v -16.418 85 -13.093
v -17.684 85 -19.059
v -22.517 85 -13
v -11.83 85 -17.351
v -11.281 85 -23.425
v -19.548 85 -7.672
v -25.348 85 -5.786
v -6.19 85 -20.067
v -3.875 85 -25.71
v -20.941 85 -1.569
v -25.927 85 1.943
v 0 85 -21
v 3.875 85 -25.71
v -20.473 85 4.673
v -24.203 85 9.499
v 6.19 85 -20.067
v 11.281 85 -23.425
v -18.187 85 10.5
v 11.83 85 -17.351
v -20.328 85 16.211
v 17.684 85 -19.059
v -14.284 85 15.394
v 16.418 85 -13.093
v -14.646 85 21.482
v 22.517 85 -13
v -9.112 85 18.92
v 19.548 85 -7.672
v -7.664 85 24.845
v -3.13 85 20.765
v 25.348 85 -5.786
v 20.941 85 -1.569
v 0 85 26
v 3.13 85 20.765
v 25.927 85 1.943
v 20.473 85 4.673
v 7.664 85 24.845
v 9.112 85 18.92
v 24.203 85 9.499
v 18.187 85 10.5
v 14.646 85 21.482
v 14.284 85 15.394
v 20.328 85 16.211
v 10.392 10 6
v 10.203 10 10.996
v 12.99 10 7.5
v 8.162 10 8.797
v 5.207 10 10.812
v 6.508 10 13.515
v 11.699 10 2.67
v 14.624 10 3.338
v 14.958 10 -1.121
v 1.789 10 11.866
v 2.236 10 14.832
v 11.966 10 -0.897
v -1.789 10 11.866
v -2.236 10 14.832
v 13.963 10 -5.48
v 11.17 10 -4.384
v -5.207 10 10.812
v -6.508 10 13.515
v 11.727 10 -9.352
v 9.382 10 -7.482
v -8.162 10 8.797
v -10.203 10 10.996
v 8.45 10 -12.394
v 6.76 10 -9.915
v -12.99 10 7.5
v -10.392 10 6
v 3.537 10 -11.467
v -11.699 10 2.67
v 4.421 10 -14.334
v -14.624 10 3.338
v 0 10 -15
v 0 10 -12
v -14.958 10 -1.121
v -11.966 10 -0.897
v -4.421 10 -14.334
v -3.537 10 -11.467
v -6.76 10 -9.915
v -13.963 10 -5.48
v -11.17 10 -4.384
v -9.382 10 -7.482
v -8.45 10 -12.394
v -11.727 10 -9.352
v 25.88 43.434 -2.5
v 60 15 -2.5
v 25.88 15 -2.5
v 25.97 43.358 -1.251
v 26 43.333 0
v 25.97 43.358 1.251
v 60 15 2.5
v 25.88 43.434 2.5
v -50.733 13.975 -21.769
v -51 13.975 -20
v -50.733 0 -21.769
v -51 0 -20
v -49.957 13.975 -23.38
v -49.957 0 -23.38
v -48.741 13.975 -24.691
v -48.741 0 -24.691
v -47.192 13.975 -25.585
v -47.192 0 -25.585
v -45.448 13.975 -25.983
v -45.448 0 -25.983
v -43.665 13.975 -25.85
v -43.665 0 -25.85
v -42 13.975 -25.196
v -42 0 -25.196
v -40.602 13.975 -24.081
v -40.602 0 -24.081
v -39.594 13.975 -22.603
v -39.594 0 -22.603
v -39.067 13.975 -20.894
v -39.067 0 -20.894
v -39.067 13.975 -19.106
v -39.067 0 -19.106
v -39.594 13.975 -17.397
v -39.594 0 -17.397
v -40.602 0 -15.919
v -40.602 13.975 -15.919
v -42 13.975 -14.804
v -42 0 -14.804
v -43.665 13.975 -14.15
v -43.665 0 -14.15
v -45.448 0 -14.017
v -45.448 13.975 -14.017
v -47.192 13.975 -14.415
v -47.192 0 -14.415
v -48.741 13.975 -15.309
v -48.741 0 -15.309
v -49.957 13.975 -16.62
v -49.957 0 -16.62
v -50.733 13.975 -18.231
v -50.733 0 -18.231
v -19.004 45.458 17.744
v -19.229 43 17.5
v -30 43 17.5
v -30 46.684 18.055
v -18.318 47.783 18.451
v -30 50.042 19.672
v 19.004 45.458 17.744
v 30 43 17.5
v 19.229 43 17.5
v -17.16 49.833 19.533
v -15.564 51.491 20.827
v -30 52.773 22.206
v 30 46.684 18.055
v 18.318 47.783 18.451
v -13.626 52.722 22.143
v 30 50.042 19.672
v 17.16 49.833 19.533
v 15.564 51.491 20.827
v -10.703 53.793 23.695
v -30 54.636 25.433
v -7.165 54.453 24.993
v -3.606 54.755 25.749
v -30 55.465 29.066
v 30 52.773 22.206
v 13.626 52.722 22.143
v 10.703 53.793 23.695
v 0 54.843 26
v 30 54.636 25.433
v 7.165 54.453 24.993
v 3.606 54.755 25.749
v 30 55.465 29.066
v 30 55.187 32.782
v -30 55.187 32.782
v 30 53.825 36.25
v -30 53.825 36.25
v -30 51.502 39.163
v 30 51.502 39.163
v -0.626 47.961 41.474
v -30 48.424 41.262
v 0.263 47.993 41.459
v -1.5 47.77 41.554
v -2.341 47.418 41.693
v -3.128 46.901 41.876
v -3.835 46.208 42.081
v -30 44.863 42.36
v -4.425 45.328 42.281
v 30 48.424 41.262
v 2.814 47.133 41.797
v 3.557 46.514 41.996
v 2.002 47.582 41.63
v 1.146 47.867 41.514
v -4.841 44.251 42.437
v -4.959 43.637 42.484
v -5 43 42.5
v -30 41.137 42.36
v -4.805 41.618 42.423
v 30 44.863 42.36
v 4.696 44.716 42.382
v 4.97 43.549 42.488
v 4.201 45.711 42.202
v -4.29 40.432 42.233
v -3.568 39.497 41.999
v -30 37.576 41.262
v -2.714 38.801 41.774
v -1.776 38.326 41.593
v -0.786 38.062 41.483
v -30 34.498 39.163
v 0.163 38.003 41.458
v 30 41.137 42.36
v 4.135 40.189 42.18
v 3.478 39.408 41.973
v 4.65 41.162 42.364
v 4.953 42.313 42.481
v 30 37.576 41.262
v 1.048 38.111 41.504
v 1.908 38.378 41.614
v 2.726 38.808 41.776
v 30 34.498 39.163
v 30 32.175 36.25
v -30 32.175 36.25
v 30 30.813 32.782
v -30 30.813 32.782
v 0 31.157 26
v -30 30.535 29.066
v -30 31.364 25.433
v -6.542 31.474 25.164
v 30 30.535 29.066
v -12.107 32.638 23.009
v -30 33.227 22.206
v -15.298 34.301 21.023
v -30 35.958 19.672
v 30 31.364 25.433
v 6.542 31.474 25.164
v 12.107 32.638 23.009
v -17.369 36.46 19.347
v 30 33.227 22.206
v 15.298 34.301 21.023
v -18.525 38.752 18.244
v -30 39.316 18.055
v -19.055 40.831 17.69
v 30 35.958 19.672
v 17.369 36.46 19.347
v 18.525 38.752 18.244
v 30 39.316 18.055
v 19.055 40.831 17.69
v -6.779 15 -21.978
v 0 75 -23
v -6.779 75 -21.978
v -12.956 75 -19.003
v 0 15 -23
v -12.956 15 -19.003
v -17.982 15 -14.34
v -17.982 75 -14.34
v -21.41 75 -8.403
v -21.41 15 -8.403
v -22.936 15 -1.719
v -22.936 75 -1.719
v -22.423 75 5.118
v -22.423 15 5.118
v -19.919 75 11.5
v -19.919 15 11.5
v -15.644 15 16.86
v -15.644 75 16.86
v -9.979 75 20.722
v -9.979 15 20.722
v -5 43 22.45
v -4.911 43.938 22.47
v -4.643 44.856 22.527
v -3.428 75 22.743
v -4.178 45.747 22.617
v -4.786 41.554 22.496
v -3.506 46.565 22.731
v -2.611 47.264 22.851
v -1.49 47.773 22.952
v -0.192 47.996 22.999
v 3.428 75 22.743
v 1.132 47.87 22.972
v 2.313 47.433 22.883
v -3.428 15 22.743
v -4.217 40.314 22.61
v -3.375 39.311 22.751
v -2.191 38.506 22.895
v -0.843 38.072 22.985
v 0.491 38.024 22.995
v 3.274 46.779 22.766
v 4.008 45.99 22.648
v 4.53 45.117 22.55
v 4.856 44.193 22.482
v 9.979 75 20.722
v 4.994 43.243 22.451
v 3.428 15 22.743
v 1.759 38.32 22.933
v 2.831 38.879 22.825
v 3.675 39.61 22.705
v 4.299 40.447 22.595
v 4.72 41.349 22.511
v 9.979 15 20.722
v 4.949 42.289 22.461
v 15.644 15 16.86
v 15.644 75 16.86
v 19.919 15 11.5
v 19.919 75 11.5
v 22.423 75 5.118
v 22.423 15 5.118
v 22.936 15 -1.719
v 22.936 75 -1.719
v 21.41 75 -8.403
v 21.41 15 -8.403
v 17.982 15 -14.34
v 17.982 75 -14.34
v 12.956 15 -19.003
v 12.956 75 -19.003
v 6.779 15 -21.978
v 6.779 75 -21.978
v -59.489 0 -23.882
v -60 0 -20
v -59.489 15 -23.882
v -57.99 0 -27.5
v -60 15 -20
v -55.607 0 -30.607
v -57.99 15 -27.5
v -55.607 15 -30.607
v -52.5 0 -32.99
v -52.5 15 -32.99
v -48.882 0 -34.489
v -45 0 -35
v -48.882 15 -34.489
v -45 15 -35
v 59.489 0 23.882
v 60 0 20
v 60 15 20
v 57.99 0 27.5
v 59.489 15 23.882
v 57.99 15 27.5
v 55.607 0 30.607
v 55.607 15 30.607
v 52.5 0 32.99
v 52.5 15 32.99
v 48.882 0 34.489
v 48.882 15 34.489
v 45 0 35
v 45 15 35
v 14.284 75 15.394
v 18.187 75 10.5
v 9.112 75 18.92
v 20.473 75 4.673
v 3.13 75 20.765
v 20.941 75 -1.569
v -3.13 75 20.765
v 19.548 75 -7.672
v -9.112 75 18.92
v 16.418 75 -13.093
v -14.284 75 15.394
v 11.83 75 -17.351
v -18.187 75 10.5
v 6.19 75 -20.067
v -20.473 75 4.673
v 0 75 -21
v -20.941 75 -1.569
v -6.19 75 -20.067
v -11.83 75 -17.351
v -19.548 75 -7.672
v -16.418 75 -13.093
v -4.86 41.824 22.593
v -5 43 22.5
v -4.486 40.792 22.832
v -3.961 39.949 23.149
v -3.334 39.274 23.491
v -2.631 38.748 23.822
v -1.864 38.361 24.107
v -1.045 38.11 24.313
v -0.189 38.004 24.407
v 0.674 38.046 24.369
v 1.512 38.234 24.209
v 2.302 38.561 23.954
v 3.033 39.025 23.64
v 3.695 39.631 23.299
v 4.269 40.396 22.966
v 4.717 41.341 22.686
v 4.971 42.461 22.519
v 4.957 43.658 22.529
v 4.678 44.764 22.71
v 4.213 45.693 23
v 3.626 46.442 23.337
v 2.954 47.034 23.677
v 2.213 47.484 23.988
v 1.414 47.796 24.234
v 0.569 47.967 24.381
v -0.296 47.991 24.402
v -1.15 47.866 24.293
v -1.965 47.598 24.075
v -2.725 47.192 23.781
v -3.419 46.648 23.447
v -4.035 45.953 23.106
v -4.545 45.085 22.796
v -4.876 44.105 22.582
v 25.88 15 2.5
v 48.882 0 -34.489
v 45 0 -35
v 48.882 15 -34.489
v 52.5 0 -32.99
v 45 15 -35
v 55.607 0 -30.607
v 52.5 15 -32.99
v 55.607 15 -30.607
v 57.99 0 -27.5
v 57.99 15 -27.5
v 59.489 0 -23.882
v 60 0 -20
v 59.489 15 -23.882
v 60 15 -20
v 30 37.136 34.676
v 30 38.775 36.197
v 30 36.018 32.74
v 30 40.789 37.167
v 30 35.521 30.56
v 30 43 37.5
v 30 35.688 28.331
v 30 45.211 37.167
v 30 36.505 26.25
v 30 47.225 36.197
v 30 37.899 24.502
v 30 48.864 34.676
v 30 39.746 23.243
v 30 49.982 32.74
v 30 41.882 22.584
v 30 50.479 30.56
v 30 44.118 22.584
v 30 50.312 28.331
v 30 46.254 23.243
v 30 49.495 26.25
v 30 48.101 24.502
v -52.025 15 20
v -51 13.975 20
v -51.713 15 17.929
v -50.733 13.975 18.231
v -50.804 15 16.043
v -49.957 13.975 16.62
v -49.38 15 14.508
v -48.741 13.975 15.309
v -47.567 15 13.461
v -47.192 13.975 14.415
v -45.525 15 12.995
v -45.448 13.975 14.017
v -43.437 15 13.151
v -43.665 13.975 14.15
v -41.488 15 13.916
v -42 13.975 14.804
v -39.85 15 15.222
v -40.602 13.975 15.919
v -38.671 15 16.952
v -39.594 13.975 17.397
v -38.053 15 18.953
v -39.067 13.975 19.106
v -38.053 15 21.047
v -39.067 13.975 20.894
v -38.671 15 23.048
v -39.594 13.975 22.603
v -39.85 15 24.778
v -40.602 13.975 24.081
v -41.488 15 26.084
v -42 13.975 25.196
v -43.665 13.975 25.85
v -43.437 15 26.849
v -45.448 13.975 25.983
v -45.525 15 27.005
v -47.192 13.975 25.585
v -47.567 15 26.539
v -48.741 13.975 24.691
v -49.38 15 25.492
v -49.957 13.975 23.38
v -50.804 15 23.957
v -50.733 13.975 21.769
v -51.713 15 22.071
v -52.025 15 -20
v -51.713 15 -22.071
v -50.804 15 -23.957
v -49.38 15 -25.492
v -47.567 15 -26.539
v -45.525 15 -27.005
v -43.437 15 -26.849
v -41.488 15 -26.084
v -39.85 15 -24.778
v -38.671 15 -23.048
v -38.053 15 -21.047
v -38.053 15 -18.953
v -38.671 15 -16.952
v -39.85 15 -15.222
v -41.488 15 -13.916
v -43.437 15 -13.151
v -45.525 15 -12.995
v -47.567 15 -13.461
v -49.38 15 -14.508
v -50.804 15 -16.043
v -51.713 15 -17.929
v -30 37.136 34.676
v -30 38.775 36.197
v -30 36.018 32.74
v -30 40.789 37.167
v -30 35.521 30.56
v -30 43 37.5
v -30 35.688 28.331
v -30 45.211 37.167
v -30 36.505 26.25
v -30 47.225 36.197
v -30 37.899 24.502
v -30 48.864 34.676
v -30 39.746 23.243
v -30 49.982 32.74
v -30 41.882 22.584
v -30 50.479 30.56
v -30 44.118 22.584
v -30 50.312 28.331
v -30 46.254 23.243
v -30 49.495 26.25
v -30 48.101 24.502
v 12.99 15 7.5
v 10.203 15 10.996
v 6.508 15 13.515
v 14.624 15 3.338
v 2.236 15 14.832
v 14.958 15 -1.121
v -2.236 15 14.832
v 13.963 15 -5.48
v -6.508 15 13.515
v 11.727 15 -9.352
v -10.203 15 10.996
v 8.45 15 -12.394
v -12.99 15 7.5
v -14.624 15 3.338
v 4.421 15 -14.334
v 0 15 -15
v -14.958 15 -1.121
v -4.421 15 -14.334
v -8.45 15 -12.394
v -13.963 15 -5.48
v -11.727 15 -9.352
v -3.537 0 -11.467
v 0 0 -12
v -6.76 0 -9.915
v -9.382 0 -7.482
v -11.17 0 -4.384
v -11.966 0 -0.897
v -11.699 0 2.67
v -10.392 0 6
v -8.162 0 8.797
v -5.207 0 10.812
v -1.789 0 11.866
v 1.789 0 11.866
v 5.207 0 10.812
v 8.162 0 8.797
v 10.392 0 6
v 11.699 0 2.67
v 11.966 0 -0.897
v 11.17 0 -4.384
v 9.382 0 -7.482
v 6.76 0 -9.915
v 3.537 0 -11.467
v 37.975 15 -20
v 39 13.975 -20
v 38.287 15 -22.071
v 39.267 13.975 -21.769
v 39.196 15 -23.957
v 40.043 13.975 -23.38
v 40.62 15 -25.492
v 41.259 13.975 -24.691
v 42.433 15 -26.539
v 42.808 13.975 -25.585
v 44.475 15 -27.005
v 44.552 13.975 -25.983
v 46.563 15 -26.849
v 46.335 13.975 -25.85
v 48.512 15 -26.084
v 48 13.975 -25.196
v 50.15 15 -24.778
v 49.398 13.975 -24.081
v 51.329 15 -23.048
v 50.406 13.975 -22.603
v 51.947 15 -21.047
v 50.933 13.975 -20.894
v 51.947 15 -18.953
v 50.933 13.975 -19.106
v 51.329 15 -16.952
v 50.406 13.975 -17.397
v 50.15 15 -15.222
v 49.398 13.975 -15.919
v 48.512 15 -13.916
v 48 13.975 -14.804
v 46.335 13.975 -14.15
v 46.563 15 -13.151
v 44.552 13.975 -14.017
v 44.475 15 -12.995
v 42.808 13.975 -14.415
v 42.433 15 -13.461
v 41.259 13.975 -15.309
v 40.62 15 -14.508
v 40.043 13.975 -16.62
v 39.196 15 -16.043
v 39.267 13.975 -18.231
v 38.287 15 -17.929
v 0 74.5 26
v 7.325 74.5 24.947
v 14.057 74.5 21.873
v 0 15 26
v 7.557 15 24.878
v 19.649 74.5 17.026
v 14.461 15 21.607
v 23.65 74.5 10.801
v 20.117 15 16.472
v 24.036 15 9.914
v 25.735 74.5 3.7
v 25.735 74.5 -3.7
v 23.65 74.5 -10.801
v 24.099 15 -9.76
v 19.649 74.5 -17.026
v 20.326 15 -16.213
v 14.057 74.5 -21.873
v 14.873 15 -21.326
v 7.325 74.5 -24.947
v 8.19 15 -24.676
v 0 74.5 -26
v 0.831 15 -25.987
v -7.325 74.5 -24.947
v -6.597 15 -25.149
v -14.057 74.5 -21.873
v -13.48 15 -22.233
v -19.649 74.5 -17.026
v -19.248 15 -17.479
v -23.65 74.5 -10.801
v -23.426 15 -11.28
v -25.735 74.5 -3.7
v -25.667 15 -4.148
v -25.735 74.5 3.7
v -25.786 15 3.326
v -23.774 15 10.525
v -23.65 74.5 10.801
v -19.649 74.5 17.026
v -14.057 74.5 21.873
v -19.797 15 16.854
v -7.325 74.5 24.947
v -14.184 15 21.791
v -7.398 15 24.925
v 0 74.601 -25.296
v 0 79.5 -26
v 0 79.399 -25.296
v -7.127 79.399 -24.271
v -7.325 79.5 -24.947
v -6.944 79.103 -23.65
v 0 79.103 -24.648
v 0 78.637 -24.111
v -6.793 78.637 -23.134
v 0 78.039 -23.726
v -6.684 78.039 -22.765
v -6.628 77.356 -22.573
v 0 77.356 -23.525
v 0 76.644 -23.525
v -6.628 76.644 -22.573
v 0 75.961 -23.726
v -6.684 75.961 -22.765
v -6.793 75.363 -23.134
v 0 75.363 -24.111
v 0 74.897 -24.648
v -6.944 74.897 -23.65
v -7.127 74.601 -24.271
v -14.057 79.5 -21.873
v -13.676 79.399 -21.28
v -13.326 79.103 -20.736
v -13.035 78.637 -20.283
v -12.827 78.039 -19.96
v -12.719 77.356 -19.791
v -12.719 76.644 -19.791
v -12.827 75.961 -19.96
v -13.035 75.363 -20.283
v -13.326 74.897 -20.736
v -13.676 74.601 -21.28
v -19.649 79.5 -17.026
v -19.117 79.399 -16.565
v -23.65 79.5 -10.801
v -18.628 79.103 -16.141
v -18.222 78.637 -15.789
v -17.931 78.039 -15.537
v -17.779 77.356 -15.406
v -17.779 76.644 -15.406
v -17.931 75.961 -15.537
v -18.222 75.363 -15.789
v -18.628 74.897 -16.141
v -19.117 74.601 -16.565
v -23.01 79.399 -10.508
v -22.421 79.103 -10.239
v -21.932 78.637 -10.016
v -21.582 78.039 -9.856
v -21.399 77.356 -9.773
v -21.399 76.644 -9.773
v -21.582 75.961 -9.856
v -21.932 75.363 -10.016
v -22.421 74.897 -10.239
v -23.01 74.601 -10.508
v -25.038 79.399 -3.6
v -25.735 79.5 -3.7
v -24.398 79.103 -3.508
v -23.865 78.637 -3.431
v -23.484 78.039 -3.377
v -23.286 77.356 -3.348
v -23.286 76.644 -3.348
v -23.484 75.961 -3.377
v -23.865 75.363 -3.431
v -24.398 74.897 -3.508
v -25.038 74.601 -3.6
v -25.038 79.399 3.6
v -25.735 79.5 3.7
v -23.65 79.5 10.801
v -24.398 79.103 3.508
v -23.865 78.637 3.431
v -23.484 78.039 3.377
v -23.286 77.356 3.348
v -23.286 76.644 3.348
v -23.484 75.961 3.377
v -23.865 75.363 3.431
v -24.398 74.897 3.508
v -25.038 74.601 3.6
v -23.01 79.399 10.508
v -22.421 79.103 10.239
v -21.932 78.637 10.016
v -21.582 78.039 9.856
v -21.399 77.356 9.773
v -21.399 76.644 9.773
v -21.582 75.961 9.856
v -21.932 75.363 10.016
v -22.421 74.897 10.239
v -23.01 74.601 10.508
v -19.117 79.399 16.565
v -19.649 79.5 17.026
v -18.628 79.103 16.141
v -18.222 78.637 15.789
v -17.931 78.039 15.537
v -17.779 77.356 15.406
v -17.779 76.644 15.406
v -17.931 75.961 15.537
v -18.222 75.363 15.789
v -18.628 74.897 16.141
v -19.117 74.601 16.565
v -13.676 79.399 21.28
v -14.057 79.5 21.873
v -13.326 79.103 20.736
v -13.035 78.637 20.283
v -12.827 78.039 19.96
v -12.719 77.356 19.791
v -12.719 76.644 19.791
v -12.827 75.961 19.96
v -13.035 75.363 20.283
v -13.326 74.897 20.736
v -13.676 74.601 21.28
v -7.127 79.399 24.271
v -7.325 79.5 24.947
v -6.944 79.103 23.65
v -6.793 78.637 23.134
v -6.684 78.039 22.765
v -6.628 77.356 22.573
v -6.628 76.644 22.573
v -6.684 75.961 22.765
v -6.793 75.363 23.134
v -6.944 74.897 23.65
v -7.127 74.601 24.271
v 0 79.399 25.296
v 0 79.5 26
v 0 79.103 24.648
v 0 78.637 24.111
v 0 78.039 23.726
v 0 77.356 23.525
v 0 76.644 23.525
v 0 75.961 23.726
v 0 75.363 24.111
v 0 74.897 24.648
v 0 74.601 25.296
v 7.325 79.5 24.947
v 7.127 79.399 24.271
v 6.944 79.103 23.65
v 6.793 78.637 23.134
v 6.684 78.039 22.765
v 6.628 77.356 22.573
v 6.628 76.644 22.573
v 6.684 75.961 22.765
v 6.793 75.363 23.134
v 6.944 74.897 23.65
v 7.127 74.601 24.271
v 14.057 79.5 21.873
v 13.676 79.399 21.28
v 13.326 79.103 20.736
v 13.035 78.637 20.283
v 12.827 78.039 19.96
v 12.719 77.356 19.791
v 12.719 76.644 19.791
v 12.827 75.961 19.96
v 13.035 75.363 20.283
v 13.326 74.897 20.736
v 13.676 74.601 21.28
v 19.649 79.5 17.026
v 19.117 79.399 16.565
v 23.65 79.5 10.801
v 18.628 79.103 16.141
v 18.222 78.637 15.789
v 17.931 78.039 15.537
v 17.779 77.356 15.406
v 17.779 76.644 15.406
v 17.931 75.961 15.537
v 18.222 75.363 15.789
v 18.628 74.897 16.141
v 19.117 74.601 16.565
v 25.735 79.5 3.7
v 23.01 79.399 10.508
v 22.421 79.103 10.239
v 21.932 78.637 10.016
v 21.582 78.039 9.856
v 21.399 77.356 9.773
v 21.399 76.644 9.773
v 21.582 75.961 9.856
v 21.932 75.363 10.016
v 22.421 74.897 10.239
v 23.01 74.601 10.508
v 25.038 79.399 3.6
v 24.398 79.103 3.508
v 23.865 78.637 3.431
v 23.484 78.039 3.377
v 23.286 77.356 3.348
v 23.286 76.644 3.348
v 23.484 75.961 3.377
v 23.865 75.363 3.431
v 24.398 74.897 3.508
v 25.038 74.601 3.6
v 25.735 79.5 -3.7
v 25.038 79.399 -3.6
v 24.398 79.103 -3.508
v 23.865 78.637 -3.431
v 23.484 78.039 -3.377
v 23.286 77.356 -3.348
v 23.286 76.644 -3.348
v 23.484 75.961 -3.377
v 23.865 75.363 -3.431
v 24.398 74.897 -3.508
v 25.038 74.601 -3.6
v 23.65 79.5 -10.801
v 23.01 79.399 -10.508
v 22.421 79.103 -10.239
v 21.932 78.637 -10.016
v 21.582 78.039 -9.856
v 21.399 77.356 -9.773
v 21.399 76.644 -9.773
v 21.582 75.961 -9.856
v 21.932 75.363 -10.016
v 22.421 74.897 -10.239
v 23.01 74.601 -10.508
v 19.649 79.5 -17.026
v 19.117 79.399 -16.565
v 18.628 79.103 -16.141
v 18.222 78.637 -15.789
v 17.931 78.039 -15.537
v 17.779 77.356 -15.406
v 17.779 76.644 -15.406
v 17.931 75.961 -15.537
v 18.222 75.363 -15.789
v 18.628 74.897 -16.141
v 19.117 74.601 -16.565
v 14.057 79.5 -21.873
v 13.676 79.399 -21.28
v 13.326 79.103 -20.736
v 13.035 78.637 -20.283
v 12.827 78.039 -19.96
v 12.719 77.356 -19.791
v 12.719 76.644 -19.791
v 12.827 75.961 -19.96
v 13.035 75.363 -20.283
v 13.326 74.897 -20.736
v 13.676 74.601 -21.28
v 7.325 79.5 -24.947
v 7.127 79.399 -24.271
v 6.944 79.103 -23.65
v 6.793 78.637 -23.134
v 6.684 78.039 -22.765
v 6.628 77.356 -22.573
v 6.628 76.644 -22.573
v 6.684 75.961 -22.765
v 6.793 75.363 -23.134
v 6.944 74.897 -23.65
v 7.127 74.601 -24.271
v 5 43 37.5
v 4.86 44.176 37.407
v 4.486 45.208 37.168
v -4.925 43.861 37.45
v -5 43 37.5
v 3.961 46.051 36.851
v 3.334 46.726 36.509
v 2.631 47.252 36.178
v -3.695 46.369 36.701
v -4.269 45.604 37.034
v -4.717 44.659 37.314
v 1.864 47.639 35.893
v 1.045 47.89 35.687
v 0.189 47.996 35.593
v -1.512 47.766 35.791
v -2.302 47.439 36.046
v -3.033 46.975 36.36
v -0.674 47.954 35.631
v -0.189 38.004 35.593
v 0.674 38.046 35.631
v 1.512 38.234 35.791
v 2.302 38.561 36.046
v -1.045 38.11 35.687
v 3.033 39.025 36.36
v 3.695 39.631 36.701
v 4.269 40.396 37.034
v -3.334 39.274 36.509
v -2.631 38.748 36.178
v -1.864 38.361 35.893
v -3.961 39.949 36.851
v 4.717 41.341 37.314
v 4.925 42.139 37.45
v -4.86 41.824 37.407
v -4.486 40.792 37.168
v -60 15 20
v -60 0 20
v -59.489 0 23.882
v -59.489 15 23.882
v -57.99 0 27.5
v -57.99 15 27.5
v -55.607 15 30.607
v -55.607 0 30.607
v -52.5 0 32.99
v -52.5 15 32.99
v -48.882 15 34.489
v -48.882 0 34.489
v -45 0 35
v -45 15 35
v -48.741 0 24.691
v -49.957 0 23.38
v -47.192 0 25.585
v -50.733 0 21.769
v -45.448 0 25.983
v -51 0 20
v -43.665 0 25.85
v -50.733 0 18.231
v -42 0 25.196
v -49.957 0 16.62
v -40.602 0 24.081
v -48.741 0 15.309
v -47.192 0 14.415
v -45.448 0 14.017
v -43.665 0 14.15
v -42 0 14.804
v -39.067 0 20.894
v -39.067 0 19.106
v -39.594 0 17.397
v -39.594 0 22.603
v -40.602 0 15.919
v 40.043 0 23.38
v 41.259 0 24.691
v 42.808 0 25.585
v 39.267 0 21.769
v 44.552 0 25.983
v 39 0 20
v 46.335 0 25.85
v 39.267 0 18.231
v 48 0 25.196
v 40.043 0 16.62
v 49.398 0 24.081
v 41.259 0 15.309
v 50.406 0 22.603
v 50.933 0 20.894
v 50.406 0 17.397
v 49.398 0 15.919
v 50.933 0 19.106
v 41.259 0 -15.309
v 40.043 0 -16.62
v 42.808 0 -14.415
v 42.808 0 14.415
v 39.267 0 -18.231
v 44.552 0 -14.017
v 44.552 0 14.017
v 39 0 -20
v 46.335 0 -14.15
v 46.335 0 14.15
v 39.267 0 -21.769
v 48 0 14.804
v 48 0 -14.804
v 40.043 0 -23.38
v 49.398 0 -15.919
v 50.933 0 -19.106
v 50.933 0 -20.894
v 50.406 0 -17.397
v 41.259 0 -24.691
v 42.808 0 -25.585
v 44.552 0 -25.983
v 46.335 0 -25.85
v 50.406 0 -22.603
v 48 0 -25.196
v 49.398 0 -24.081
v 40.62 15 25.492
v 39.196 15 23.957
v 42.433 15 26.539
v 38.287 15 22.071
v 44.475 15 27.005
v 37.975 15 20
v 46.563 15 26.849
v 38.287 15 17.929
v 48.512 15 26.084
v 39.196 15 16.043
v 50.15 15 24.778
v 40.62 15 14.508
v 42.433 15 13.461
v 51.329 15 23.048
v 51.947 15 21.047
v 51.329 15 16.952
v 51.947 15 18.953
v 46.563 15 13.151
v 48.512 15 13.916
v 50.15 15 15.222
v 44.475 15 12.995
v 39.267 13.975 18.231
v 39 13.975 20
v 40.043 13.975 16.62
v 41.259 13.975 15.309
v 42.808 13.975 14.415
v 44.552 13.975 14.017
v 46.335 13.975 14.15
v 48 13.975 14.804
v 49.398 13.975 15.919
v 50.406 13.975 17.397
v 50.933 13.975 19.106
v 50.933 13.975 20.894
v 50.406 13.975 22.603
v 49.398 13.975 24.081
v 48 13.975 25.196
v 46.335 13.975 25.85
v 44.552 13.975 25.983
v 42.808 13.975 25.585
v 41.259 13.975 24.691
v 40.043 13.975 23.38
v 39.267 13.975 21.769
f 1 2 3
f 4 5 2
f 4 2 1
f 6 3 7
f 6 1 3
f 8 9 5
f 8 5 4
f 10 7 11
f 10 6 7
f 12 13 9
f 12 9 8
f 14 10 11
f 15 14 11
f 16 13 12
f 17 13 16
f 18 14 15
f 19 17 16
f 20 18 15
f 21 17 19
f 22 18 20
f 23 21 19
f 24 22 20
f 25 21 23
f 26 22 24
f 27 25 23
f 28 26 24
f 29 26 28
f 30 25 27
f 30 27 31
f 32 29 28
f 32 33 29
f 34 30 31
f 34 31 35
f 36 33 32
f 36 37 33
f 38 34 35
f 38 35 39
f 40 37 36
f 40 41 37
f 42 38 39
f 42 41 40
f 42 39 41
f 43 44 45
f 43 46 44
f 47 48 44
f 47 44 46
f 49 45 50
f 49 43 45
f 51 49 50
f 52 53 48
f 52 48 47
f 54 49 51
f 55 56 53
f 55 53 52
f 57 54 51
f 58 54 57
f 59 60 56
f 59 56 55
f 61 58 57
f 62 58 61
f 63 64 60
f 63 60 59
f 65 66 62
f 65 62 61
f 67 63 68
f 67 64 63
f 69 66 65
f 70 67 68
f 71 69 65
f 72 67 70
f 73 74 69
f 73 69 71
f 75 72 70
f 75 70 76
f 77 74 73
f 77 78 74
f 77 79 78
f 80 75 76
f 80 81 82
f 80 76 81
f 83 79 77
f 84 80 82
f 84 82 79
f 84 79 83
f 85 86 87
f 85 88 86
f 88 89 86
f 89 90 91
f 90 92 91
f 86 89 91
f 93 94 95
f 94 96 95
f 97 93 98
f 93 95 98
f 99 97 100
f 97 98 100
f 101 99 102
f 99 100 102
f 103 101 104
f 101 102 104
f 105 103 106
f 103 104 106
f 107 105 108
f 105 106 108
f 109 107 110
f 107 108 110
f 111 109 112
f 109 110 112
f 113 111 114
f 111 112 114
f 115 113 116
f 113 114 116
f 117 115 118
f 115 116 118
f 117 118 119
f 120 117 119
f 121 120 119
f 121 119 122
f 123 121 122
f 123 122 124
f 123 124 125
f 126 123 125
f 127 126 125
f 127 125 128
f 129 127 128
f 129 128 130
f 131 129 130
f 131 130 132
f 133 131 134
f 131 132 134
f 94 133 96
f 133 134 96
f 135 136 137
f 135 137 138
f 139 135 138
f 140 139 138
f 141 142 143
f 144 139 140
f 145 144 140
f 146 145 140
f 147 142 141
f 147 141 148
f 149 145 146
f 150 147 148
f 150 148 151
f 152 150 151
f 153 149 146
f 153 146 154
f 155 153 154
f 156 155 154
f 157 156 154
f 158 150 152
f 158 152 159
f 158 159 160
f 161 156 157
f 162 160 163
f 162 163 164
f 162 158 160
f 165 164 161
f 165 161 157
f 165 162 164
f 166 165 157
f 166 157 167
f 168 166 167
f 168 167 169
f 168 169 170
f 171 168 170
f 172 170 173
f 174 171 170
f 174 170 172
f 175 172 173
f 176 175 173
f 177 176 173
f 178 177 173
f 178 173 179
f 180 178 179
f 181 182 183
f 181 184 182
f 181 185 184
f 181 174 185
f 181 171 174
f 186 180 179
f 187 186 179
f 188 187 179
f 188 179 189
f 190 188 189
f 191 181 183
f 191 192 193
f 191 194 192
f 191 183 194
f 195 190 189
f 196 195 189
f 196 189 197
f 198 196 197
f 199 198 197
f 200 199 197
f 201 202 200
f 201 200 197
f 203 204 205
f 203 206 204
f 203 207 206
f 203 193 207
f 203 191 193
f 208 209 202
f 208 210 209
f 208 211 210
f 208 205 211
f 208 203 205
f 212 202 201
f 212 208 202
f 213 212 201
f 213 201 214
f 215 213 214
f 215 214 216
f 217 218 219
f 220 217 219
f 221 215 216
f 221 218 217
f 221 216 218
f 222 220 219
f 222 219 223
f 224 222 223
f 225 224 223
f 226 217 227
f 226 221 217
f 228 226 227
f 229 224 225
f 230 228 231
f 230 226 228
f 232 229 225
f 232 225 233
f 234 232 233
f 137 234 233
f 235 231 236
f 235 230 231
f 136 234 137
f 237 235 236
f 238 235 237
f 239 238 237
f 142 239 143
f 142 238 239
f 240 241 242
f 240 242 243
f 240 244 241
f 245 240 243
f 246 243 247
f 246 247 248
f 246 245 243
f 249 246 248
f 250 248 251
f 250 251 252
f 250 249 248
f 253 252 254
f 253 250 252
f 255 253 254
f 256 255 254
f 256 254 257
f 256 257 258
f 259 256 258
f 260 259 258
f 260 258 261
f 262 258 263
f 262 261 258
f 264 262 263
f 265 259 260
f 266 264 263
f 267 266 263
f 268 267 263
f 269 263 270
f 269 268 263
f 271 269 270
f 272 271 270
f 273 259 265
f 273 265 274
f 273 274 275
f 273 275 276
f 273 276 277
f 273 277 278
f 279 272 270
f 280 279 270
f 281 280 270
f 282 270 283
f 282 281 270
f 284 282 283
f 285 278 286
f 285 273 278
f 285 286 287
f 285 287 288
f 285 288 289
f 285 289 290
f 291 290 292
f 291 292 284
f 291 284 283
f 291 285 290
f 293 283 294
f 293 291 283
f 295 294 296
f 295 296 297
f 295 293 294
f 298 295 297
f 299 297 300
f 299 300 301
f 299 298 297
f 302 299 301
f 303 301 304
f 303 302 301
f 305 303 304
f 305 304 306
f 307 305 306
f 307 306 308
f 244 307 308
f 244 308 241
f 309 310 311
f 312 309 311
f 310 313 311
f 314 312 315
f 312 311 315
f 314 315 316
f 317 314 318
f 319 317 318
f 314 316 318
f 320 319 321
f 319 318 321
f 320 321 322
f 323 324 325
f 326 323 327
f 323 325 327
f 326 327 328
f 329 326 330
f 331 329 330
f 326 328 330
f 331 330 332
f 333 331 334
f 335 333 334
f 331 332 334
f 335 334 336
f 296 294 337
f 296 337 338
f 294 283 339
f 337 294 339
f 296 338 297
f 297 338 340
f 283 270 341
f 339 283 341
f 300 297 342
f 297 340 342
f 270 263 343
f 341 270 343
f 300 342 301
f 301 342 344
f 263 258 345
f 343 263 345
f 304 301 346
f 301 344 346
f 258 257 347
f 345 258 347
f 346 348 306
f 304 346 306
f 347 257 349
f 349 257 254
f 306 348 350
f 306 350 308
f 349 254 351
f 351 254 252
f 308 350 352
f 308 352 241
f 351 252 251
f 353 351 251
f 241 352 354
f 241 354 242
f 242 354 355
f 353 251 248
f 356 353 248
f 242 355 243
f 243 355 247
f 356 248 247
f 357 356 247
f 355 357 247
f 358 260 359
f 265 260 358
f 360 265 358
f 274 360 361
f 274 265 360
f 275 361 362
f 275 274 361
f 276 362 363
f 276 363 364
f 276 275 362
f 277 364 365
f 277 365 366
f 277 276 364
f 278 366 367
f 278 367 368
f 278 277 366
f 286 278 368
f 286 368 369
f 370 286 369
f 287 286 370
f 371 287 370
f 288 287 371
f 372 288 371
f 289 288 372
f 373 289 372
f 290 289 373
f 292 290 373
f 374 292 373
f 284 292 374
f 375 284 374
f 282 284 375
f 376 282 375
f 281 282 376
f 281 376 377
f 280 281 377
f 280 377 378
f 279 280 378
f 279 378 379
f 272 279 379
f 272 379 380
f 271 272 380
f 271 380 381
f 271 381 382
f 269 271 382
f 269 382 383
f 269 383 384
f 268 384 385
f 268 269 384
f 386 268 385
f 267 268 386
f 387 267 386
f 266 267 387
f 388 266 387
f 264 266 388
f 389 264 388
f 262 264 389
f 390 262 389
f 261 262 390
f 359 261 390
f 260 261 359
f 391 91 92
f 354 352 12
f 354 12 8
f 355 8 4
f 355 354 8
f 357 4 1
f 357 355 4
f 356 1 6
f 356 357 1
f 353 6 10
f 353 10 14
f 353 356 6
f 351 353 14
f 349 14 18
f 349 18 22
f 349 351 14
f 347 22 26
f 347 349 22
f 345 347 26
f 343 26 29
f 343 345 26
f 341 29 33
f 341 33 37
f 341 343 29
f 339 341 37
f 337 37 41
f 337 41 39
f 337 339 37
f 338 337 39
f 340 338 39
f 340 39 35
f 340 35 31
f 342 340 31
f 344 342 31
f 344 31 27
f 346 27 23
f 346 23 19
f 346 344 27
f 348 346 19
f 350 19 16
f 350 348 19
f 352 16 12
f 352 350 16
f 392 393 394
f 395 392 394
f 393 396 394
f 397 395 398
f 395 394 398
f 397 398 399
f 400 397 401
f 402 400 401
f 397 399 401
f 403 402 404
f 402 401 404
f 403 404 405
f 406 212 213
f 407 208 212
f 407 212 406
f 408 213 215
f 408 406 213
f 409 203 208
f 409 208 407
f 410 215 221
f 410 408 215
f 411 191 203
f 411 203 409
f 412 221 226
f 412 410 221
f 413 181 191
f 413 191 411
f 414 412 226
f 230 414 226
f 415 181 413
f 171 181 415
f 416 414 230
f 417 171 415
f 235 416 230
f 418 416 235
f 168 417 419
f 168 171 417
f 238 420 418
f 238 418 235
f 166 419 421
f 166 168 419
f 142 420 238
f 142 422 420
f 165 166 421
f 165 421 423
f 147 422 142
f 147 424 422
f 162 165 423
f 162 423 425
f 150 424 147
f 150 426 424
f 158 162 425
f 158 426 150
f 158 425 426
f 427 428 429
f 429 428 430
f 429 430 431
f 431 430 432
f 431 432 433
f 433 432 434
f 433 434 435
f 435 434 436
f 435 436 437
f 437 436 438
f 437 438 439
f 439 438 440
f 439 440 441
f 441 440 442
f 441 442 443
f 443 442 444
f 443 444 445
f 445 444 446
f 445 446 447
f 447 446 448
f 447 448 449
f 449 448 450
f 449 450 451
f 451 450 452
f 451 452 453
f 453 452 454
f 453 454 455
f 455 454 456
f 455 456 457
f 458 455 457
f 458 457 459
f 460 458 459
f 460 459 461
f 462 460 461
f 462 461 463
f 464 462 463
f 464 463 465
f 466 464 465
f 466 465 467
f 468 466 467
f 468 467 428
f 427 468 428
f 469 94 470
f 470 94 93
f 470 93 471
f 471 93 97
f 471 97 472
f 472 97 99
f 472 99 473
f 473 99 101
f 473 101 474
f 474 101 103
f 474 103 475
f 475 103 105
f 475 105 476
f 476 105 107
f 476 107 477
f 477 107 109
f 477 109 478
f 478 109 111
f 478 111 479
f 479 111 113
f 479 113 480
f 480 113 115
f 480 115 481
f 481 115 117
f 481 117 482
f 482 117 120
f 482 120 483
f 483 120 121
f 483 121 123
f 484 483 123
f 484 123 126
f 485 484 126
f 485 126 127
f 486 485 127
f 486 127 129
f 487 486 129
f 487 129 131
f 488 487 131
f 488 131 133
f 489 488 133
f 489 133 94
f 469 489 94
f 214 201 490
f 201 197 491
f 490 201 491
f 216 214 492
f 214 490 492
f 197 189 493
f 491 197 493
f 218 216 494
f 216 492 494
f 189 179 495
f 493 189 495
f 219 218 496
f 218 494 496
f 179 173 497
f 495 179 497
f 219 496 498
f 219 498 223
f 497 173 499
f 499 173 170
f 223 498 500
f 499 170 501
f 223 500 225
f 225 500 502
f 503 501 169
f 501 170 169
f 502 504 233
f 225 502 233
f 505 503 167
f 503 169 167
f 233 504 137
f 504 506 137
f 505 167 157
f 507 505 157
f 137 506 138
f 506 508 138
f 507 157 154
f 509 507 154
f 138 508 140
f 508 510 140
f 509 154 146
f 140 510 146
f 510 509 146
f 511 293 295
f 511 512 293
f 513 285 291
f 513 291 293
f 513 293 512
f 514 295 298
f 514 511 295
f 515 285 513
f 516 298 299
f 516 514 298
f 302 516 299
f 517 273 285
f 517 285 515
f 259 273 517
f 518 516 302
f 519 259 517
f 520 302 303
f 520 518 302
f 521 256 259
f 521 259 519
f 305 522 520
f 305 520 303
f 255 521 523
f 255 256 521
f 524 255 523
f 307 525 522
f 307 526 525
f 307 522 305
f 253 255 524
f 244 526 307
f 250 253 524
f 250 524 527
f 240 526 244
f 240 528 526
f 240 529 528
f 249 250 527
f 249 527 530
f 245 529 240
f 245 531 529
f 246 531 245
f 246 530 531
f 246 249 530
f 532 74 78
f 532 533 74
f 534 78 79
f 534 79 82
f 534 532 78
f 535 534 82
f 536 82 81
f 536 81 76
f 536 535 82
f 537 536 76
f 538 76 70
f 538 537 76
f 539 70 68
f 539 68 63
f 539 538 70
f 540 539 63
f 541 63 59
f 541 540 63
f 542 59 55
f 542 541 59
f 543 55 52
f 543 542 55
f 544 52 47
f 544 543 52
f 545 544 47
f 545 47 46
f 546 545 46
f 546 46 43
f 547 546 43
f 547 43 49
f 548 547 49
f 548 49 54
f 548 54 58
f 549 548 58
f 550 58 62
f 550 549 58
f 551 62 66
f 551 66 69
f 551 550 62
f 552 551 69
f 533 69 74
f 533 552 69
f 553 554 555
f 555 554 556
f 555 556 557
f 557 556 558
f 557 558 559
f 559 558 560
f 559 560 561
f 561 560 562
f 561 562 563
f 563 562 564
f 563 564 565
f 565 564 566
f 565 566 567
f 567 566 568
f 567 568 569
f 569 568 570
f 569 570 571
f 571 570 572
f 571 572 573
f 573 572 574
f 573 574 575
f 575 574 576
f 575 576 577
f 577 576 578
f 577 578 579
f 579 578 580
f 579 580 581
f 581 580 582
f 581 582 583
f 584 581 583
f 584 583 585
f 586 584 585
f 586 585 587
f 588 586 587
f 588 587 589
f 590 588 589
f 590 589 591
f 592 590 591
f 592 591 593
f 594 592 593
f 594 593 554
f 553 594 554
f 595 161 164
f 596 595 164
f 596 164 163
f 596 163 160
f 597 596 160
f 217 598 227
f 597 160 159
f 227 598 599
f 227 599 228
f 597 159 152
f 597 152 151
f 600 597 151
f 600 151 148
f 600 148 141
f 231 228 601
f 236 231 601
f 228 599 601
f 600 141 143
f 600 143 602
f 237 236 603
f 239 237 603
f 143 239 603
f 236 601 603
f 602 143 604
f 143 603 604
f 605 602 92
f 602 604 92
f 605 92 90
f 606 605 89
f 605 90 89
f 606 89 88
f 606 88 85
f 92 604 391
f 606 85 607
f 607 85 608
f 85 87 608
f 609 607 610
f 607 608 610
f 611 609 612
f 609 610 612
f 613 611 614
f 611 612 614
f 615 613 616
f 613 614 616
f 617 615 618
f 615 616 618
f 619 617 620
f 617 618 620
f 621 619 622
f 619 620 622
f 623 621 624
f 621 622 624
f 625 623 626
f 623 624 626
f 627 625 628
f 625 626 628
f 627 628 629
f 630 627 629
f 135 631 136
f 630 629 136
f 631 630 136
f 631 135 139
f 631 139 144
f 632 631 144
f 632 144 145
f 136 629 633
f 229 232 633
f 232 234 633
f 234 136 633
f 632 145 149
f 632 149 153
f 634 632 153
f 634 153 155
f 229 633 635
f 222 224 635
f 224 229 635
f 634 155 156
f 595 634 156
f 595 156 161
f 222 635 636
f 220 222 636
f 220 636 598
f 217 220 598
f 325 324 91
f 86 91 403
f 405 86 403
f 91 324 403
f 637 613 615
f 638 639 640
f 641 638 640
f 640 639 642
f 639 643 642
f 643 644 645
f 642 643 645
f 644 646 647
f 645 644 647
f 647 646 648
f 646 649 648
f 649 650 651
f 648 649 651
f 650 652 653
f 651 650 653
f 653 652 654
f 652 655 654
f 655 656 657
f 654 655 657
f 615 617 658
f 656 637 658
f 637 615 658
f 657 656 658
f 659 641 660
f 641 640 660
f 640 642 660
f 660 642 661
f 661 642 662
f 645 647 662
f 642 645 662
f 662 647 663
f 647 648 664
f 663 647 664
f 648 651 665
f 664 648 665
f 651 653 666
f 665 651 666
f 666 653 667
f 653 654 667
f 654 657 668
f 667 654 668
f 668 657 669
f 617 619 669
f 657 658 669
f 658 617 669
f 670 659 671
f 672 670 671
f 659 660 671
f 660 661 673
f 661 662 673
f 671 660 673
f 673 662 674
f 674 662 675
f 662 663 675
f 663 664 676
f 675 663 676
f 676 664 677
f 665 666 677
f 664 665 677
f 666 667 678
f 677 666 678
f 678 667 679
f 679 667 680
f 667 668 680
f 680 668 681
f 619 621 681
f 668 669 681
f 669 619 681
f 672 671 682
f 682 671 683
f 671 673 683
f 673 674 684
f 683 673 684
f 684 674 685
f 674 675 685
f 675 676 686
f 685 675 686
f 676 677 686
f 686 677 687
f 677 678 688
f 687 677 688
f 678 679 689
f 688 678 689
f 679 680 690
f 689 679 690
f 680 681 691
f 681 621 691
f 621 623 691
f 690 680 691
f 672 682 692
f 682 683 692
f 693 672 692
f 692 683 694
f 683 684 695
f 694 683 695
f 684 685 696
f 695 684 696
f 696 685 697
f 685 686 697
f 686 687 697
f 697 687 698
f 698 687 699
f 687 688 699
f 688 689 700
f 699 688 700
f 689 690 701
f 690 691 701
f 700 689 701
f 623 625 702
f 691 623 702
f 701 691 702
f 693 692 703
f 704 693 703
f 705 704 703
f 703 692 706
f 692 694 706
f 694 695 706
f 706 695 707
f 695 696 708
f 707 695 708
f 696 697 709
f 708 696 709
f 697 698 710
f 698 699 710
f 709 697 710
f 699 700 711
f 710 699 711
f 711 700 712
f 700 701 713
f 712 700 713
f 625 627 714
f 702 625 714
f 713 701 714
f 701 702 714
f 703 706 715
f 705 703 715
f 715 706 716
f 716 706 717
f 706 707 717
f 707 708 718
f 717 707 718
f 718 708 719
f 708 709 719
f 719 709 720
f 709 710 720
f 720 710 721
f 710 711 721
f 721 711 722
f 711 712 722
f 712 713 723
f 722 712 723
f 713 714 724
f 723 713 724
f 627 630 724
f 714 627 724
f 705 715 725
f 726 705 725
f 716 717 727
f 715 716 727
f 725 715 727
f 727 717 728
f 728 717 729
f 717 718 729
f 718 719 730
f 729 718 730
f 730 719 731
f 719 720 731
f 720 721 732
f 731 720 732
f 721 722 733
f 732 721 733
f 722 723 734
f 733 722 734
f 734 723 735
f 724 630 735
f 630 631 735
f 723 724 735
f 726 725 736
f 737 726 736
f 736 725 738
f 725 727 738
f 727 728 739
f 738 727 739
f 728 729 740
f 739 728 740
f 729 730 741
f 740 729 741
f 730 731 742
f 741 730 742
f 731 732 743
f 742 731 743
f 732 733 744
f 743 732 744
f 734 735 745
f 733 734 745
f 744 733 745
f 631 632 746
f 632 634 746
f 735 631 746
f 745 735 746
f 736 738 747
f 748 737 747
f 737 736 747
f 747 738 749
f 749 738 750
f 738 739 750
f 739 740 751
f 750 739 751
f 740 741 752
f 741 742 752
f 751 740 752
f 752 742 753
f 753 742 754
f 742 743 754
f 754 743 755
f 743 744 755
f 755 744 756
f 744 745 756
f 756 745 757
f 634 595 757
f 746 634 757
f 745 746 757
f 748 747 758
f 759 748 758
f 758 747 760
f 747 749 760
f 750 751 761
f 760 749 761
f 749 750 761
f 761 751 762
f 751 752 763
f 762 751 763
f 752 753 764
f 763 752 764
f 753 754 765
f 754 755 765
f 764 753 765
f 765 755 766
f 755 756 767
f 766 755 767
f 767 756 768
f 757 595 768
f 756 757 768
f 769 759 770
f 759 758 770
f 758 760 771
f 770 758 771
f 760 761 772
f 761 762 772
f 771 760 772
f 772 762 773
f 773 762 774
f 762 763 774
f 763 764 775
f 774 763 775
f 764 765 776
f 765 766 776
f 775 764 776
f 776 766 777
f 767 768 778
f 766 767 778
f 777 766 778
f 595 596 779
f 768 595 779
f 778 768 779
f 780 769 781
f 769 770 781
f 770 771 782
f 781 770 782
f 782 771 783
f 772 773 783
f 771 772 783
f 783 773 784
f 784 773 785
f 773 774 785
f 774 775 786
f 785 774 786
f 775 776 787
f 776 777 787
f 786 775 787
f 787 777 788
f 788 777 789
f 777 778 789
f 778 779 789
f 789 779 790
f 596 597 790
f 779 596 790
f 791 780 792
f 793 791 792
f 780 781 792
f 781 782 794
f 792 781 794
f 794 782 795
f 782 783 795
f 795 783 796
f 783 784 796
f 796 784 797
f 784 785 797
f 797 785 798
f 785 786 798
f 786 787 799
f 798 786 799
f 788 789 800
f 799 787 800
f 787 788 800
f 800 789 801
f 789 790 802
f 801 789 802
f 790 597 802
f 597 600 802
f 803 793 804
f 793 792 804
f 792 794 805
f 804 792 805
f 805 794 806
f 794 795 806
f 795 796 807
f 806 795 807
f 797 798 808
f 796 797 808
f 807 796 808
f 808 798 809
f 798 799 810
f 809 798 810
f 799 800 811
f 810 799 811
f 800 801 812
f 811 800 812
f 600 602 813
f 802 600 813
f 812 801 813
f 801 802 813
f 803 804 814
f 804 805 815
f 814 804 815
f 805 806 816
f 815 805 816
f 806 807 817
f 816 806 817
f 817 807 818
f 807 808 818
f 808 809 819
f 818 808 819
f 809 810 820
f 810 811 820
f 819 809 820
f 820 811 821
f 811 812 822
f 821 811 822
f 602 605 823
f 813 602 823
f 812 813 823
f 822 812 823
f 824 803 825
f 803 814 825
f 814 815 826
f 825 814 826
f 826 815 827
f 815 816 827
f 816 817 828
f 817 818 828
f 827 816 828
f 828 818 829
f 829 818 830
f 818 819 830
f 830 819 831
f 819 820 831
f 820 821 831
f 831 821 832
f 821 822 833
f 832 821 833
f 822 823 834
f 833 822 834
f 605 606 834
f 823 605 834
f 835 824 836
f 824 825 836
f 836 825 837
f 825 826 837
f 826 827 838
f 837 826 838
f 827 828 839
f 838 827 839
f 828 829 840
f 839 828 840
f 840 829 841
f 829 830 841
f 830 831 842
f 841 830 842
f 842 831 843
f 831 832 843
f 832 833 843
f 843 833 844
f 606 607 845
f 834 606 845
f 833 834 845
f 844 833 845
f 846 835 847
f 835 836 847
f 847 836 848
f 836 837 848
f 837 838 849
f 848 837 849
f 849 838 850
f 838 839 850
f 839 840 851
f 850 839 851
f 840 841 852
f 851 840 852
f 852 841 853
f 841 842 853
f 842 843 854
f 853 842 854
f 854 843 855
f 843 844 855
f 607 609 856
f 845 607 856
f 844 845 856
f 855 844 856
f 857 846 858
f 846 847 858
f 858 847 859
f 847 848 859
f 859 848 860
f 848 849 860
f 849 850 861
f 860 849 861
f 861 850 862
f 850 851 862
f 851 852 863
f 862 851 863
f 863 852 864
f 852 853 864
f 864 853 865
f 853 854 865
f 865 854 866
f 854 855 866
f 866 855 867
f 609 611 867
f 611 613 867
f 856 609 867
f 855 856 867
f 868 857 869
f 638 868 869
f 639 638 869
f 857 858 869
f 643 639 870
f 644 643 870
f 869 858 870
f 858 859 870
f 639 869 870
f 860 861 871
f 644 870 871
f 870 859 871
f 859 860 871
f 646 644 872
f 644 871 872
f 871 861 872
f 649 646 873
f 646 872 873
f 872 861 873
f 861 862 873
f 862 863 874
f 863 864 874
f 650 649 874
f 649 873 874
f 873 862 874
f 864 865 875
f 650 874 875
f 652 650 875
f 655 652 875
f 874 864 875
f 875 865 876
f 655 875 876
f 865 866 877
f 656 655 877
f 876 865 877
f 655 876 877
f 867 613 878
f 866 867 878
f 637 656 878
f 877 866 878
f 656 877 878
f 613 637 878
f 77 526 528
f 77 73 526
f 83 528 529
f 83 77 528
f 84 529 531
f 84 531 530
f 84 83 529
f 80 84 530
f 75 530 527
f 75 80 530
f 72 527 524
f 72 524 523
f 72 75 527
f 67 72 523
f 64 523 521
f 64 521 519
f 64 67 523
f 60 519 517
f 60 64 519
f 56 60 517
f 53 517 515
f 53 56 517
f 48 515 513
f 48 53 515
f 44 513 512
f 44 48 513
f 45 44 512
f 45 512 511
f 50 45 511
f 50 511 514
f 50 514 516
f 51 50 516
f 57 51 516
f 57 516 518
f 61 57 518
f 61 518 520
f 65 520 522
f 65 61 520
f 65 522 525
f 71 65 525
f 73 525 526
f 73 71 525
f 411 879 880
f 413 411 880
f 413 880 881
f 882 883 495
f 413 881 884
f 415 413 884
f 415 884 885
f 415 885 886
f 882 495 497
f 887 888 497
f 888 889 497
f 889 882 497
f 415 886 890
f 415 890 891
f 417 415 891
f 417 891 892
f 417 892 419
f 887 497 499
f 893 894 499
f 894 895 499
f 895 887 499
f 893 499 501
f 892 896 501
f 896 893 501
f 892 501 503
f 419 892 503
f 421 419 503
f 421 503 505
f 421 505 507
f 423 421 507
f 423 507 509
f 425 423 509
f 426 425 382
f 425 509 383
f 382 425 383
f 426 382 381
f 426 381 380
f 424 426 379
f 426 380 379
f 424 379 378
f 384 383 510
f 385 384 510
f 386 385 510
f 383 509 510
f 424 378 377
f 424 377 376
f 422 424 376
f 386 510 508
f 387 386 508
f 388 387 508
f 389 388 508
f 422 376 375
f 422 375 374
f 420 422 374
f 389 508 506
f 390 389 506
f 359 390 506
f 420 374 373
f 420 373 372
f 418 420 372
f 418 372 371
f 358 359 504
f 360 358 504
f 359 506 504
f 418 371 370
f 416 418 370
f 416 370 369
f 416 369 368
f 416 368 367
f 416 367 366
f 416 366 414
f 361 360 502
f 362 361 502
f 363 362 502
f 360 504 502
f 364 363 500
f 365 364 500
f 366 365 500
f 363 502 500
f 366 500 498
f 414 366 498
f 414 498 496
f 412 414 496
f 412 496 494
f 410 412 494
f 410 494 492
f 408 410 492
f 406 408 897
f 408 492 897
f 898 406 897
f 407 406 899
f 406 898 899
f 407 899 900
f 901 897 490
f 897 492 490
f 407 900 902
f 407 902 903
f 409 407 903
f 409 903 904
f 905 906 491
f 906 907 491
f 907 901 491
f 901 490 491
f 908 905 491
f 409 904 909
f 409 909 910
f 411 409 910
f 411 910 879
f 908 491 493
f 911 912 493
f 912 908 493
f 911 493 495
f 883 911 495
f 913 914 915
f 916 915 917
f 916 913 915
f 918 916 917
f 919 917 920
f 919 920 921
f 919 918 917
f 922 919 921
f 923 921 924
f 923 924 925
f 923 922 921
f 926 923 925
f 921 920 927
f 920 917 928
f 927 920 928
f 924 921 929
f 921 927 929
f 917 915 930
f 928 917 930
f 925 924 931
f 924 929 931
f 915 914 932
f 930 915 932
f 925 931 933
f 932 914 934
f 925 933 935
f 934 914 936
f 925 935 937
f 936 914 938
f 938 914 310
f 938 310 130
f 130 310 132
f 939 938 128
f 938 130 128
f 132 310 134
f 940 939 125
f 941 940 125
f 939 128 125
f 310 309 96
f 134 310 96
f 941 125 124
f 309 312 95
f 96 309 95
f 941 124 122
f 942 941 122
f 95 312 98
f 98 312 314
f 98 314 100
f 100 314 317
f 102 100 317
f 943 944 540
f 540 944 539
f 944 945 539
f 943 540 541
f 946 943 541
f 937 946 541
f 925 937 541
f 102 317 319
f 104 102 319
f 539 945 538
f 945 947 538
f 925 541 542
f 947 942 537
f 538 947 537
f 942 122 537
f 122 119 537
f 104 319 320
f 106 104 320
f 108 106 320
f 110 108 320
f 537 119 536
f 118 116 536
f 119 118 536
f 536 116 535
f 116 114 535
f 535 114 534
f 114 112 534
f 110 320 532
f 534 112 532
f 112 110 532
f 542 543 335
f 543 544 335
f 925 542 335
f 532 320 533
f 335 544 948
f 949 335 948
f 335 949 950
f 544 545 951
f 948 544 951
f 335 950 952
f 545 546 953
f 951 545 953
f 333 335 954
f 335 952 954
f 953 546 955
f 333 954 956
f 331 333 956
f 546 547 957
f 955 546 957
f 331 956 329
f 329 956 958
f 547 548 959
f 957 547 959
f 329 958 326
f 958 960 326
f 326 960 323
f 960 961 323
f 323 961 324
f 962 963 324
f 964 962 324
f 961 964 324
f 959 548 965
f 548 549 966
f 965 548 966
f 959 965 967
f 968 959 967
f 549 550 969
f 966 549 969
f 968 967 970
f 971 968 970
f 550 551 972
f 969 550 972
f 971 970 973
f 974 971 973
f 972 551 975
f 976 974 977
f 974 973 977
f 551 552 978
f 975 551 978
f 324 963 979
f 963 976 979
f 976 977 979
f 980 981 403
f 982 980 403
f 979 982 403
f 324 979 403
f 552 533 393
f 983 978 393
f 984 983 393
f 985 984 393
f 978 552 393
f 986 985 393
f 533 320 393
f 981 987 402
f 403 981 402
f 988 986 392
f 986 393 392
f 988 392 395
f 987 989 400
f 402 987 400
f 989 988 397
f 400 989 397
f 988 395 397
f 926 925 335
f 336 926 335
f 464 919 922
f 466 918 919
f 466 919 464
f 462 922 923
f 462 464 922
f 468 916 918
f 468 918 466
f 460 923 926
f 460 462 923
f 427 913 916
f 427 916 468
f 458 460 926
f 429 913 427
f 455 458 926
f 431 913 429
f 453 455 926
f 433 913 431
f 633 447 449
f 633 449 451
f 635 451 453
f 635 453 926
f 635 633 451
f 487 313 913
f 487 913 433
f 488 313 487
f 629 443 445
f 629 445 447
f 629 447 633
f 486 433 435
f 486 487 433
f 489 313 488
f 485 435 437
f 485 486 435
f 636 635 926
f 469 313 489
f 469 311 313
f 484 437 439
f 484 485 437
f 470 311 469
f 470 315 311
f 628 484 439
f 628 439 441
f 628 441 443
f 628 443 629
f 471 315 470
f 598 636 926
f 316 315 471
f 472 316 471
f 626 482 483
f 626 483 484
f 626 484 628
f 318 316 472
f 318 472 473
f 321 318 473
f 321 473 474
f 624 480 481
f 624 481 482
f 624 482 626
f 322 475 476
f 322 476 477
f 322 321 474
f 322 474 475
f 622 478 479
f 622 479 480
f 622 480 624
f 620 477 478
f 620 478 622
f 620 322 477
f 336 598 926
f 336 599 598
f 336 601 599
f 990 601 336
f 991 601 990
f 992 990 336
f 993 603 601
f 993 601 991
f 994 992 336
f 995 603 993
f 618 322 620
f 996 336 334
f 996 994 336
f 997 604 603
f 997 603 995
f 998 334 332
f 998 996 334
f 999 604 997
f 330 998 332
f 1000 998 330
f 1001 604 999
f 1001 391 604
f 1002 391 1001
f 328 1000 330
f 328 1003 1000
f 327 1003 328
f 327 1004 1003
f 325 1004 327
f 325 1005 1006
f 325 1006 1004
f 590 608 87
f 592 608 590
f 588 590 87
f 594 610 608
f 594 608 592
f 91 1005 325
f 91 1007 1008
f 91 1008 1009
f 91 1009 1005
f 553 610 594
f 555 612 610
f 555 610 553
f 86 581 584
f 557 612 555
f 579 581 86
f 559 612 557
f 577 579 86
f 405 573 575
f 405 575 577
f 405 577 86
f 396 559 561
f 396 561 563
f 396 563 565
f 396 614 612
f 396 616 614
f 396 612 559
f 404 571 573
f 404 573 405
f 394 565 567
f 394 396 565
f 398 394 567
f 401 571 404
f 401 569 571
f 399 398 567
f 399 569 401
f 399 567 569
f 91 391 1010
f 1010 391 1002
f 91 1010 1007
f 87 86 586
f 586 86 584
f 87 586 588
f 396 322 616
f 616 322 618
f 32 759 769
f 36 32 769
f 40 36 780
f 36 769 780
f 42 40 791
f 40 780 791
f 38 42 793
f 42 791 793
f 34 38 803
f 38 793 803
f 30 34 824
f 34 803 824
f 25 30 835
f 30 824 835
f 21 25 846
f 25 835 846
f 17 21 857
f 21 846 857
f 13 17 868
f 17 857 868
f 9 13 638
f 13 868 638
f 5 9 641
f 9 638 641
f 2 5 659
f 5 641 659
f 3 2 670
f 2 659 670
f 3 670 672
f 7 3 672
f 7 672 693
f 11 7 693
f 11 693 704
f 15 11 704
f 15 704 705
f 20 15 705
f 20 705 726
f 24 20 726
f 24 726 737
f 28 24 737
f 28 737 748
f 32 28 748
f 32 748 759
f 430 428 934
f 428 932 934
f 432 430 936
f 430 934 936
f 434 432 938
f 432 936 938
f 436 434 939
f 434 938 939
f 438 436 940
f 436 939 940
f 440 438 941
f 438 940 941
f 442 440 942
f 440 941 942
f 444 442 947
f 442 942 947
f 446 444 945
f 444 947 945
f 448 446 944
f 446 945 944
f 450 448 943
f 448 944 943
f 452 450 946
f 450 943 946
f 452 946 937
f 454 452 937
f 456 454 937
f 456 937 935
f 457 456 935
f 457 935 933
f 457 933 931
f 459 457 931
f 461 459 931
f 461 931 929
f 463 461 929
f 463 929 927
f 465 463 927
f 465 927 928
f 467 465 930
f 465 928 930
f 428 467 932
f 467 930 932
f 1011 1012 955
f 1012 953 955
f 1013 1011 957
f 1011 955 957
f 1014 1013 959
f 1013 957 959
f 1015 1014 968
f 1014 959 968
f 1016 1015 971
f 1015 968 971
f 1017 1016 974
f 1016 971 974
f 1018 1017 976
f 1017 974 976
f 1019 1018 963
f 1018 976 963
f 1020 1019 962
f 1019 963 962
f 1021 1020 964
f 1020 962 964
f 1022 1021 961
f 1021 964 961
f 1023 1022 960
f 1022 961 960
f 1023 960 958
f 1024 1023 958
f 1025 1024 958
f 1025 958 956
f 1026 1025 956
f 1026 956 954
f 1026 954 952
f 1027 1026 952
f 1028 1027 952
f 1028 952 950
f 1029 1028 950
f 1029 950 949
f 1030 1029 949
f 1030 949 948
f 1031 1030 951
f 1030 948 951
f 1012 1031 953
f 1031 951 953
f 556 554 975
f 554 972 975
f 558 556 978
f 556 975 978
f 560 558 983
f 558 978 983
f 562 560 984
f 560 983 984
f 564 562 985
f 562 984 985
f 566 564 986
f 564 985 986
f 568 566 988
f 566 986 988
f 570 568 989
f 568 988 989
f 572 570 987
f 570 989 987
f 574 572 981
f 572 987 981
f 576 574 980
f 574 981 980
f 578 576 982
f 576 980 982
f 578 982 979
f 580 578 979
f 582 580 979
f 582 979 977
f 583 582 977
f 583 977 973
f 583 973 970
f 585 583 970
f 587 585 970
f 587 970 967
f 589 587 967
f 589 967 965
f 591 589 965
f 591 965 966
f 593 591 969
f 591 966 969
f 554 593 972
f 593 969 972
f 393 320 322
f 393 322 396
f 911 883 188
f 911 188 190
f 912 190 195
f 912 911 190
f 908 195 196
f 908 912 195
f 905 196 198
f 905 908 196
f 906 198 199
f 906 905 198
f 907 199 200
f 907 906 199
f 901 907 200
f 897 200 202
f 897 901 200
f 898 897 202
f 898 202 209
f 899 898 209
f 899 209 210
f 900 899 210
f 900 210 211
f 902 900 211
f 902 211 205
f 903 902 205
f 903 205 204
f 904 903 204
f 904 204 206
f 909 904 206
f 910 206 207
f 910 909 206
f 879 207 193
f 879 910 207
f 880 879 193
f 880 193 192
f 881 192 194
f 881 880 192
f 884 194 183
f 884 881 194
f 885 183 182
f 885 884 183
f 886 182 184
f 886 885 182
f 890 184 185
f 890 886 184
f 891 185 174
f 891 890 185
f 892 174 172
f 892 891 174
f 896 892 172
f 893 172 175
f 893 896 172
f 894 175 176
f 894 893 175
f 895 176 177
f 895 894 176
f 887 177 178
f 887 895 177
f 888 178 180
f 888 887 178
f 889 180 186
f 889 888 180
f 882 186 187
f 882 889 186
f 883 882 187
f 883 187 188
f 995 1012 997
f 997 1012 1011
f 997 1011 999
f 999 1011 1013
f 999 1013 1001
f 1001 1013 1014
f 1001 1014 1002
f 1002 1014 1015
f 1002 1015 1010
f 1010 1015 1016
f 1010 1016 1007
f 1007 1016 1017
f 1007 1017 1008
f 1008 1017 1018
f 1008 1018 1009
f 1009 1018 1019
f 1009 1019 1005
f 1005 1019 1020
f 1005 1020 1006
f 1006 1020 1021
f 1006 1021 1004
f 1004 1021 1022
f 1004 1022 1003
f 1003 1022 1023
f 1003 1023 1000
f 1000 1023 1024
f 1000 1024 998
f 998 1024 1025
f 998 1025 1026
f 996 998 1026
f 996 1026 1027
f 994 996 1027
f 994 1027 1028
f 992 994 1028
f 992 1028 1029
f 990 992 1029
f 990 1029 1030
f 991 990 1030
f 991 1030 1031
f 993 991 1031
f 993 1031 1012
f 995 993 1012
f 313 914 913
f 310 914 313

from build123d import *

# Parameters (mm, degrees)
SKETCH1_W                    = 120
SKETCH1_H                    = 70
BOSS_EXTRUDE1_DEPTH          = 15
SKETCH2_R                    = 26
BOSS_EXTRUDE2_DEPTH          = 70
SKETCH8_R                    = 2.5
BOSS_EXTRUDE3_DEPTH          = 2.5
SKETCH10_R                   = 12.5
BOSS_EXTRUDE4_DEPTH          = 60
SKETCH11_R                   = 23
CUT_EXTRUDE1_DEPTH           = 60
HOLE2_D                      = 15
SKETCH14_R                   = 5
CUT_EXTRUDE2_DEPTH           = 60
FILLET1_R                    = 15
M14_TAPPED_HOLE1_D           = 12
M14_TAPPED_HOLE1_CSINK_D     = 14.05
M14_TAPPED_HOLE1_CSINK_ANGLE = 90


with BuildPart() as part:
    # Sketch1 → Boss-Extrude1 (new body)
    with BuildSketch(Plane(origin=(0, 0, 0), x_dir=(1, 0, 0), z_dir=(0, 1, 0))):
        Rectangle(SKETCH1_W, SKETCH1_H)
    extrude(amount=BOSS_EXTRUDE1_DEPTH)

    # Sketch2 → Boss-Extrude2 (add)
    with BuildSketch(Plane(origin=(0, 15, 0), x_dir=(1, 0, 0), z_dir=(0, 1, 0))):
        with Locations(Location((0, 0, 0), (0, 0, 270))):
            Circle(SKETCH2_R)
    extrude(amount=BOSS_EXTRUDE2_DEPTH)

    # Sketch7 → Cut-Revolve2 (revolve, cut)
    with BuildSketch(Plane.XY, mode=Mode.PRIVATE) as cut_revolve2_sk:
        Polygon((0, 0), (0, 85), (21, 85), (21, 65), (23, 65), (23, 15), (15, 15), (15, 10), (12, 10), (12, 0), align=None)
    revolve(cut_revolve2_sk.sketch.rotate(Axis((0, 0, 0), (0, 1, 0)), 90), axis=Axis((0, 0, 0), (0, 1, 0)), mode=Mode.SUBTRACT)

    # Sketch8 → Cut-Revolve3 (revolve, cut)
    with BuildSketch(Plane.XY, mode=Mode.PRIVATE) as cut_revolve3_sk:
        with Locations((26, 77)):
            Circle(SKETCH8_R)
    revolve(cut_revolve3_sk.sketch.rotate(Axis((0, 0, 0), (0, 1, 0)), 90), axis=Axis((0, 0, 0), (0, 1, 0)), mode=Mode.SUBTRACT)

    # Sketch9 → Boss-Extrude3 (add, symmetric)
    with BuildSketch(Plane.XY):
        Polygon((24, 45), (60, 15), (24, 15), align=None)
    extrude(amount=BOSS_EXTRUDE3_DEPTH, both=True)

    # Sketch10 → Boss-Extrude4 (add)
    with BuildSketch(Plane(origin=(30, 0, 0), x_dir=(0, 0, -1), z_dir=(1, 0, 0))):
        with Locations((-30, 43)):
            Circle(SKETCH10_R)
    extrude(amount=-BOSS_EXTRUDE4_DEPTH)

    # Sketch11 → Cut-Extrude1 (cut)
    with BuildSketch(Plane(origin=(0, 15, 0), x_dir=(1, 0, 0), z_dir=(0, 1, 0))):
        with Locations(Location((0, 0, 0), (0, 0, 90))):
            Circle(SKETCH11_R)
    extrude(amount=CUT_EXTRUDE1_DEPTH, mode=Mode.SUBTRACT)

    # Hole2 (through all)
    with Locations(Plane(origin=(30, 0, 0), x_dir=(0, 0, -1), z_dir=(1, 0, 0))):
        with Locations((-30, 43)):
            Hole(HOLE2_D / 2)

    # Sketch14 → Cut-Extrude2 (cut)
    with BuildSketch(Plane.XY):
        with Locations(Location((0, 43, 0), (0, 0, 180))):
            Circle(SKETCH14_R)
    extrude(amount=CUT_EXTRUDE2_DEPTH, mode=Mode.SUBTRACT)

    # Fillet1
    fillet1_edges = [part.edges().sort_by_distance(p)[0] for p in [
        (-60, 7.5, -35),
        (60, 7.5, -35),
        (60, 7.5, 35),
        (-60, 7.5, 35),
    ]]
    fillet(fillet1_edges, radius=FILLET1_R)

    # M14 Tapped Hole1 (through all)
    with Locations(Plane(origin=(0, 15, 0), x_dir=(1, 0, 0), z_dir=(0, 1, 0))):
        with Locations((45, -20), (45, 20), (-45, 20), (-45, -20)):
            CounterSinkHole(M14_TAPPED_HOLE1_D / 2, M14_TAPPED_HOLE1_CSINK_D / 2, counter_sink_angle=M14_TAPPED_HOLE1_CSINK_ANGLE)


solid = part.part
